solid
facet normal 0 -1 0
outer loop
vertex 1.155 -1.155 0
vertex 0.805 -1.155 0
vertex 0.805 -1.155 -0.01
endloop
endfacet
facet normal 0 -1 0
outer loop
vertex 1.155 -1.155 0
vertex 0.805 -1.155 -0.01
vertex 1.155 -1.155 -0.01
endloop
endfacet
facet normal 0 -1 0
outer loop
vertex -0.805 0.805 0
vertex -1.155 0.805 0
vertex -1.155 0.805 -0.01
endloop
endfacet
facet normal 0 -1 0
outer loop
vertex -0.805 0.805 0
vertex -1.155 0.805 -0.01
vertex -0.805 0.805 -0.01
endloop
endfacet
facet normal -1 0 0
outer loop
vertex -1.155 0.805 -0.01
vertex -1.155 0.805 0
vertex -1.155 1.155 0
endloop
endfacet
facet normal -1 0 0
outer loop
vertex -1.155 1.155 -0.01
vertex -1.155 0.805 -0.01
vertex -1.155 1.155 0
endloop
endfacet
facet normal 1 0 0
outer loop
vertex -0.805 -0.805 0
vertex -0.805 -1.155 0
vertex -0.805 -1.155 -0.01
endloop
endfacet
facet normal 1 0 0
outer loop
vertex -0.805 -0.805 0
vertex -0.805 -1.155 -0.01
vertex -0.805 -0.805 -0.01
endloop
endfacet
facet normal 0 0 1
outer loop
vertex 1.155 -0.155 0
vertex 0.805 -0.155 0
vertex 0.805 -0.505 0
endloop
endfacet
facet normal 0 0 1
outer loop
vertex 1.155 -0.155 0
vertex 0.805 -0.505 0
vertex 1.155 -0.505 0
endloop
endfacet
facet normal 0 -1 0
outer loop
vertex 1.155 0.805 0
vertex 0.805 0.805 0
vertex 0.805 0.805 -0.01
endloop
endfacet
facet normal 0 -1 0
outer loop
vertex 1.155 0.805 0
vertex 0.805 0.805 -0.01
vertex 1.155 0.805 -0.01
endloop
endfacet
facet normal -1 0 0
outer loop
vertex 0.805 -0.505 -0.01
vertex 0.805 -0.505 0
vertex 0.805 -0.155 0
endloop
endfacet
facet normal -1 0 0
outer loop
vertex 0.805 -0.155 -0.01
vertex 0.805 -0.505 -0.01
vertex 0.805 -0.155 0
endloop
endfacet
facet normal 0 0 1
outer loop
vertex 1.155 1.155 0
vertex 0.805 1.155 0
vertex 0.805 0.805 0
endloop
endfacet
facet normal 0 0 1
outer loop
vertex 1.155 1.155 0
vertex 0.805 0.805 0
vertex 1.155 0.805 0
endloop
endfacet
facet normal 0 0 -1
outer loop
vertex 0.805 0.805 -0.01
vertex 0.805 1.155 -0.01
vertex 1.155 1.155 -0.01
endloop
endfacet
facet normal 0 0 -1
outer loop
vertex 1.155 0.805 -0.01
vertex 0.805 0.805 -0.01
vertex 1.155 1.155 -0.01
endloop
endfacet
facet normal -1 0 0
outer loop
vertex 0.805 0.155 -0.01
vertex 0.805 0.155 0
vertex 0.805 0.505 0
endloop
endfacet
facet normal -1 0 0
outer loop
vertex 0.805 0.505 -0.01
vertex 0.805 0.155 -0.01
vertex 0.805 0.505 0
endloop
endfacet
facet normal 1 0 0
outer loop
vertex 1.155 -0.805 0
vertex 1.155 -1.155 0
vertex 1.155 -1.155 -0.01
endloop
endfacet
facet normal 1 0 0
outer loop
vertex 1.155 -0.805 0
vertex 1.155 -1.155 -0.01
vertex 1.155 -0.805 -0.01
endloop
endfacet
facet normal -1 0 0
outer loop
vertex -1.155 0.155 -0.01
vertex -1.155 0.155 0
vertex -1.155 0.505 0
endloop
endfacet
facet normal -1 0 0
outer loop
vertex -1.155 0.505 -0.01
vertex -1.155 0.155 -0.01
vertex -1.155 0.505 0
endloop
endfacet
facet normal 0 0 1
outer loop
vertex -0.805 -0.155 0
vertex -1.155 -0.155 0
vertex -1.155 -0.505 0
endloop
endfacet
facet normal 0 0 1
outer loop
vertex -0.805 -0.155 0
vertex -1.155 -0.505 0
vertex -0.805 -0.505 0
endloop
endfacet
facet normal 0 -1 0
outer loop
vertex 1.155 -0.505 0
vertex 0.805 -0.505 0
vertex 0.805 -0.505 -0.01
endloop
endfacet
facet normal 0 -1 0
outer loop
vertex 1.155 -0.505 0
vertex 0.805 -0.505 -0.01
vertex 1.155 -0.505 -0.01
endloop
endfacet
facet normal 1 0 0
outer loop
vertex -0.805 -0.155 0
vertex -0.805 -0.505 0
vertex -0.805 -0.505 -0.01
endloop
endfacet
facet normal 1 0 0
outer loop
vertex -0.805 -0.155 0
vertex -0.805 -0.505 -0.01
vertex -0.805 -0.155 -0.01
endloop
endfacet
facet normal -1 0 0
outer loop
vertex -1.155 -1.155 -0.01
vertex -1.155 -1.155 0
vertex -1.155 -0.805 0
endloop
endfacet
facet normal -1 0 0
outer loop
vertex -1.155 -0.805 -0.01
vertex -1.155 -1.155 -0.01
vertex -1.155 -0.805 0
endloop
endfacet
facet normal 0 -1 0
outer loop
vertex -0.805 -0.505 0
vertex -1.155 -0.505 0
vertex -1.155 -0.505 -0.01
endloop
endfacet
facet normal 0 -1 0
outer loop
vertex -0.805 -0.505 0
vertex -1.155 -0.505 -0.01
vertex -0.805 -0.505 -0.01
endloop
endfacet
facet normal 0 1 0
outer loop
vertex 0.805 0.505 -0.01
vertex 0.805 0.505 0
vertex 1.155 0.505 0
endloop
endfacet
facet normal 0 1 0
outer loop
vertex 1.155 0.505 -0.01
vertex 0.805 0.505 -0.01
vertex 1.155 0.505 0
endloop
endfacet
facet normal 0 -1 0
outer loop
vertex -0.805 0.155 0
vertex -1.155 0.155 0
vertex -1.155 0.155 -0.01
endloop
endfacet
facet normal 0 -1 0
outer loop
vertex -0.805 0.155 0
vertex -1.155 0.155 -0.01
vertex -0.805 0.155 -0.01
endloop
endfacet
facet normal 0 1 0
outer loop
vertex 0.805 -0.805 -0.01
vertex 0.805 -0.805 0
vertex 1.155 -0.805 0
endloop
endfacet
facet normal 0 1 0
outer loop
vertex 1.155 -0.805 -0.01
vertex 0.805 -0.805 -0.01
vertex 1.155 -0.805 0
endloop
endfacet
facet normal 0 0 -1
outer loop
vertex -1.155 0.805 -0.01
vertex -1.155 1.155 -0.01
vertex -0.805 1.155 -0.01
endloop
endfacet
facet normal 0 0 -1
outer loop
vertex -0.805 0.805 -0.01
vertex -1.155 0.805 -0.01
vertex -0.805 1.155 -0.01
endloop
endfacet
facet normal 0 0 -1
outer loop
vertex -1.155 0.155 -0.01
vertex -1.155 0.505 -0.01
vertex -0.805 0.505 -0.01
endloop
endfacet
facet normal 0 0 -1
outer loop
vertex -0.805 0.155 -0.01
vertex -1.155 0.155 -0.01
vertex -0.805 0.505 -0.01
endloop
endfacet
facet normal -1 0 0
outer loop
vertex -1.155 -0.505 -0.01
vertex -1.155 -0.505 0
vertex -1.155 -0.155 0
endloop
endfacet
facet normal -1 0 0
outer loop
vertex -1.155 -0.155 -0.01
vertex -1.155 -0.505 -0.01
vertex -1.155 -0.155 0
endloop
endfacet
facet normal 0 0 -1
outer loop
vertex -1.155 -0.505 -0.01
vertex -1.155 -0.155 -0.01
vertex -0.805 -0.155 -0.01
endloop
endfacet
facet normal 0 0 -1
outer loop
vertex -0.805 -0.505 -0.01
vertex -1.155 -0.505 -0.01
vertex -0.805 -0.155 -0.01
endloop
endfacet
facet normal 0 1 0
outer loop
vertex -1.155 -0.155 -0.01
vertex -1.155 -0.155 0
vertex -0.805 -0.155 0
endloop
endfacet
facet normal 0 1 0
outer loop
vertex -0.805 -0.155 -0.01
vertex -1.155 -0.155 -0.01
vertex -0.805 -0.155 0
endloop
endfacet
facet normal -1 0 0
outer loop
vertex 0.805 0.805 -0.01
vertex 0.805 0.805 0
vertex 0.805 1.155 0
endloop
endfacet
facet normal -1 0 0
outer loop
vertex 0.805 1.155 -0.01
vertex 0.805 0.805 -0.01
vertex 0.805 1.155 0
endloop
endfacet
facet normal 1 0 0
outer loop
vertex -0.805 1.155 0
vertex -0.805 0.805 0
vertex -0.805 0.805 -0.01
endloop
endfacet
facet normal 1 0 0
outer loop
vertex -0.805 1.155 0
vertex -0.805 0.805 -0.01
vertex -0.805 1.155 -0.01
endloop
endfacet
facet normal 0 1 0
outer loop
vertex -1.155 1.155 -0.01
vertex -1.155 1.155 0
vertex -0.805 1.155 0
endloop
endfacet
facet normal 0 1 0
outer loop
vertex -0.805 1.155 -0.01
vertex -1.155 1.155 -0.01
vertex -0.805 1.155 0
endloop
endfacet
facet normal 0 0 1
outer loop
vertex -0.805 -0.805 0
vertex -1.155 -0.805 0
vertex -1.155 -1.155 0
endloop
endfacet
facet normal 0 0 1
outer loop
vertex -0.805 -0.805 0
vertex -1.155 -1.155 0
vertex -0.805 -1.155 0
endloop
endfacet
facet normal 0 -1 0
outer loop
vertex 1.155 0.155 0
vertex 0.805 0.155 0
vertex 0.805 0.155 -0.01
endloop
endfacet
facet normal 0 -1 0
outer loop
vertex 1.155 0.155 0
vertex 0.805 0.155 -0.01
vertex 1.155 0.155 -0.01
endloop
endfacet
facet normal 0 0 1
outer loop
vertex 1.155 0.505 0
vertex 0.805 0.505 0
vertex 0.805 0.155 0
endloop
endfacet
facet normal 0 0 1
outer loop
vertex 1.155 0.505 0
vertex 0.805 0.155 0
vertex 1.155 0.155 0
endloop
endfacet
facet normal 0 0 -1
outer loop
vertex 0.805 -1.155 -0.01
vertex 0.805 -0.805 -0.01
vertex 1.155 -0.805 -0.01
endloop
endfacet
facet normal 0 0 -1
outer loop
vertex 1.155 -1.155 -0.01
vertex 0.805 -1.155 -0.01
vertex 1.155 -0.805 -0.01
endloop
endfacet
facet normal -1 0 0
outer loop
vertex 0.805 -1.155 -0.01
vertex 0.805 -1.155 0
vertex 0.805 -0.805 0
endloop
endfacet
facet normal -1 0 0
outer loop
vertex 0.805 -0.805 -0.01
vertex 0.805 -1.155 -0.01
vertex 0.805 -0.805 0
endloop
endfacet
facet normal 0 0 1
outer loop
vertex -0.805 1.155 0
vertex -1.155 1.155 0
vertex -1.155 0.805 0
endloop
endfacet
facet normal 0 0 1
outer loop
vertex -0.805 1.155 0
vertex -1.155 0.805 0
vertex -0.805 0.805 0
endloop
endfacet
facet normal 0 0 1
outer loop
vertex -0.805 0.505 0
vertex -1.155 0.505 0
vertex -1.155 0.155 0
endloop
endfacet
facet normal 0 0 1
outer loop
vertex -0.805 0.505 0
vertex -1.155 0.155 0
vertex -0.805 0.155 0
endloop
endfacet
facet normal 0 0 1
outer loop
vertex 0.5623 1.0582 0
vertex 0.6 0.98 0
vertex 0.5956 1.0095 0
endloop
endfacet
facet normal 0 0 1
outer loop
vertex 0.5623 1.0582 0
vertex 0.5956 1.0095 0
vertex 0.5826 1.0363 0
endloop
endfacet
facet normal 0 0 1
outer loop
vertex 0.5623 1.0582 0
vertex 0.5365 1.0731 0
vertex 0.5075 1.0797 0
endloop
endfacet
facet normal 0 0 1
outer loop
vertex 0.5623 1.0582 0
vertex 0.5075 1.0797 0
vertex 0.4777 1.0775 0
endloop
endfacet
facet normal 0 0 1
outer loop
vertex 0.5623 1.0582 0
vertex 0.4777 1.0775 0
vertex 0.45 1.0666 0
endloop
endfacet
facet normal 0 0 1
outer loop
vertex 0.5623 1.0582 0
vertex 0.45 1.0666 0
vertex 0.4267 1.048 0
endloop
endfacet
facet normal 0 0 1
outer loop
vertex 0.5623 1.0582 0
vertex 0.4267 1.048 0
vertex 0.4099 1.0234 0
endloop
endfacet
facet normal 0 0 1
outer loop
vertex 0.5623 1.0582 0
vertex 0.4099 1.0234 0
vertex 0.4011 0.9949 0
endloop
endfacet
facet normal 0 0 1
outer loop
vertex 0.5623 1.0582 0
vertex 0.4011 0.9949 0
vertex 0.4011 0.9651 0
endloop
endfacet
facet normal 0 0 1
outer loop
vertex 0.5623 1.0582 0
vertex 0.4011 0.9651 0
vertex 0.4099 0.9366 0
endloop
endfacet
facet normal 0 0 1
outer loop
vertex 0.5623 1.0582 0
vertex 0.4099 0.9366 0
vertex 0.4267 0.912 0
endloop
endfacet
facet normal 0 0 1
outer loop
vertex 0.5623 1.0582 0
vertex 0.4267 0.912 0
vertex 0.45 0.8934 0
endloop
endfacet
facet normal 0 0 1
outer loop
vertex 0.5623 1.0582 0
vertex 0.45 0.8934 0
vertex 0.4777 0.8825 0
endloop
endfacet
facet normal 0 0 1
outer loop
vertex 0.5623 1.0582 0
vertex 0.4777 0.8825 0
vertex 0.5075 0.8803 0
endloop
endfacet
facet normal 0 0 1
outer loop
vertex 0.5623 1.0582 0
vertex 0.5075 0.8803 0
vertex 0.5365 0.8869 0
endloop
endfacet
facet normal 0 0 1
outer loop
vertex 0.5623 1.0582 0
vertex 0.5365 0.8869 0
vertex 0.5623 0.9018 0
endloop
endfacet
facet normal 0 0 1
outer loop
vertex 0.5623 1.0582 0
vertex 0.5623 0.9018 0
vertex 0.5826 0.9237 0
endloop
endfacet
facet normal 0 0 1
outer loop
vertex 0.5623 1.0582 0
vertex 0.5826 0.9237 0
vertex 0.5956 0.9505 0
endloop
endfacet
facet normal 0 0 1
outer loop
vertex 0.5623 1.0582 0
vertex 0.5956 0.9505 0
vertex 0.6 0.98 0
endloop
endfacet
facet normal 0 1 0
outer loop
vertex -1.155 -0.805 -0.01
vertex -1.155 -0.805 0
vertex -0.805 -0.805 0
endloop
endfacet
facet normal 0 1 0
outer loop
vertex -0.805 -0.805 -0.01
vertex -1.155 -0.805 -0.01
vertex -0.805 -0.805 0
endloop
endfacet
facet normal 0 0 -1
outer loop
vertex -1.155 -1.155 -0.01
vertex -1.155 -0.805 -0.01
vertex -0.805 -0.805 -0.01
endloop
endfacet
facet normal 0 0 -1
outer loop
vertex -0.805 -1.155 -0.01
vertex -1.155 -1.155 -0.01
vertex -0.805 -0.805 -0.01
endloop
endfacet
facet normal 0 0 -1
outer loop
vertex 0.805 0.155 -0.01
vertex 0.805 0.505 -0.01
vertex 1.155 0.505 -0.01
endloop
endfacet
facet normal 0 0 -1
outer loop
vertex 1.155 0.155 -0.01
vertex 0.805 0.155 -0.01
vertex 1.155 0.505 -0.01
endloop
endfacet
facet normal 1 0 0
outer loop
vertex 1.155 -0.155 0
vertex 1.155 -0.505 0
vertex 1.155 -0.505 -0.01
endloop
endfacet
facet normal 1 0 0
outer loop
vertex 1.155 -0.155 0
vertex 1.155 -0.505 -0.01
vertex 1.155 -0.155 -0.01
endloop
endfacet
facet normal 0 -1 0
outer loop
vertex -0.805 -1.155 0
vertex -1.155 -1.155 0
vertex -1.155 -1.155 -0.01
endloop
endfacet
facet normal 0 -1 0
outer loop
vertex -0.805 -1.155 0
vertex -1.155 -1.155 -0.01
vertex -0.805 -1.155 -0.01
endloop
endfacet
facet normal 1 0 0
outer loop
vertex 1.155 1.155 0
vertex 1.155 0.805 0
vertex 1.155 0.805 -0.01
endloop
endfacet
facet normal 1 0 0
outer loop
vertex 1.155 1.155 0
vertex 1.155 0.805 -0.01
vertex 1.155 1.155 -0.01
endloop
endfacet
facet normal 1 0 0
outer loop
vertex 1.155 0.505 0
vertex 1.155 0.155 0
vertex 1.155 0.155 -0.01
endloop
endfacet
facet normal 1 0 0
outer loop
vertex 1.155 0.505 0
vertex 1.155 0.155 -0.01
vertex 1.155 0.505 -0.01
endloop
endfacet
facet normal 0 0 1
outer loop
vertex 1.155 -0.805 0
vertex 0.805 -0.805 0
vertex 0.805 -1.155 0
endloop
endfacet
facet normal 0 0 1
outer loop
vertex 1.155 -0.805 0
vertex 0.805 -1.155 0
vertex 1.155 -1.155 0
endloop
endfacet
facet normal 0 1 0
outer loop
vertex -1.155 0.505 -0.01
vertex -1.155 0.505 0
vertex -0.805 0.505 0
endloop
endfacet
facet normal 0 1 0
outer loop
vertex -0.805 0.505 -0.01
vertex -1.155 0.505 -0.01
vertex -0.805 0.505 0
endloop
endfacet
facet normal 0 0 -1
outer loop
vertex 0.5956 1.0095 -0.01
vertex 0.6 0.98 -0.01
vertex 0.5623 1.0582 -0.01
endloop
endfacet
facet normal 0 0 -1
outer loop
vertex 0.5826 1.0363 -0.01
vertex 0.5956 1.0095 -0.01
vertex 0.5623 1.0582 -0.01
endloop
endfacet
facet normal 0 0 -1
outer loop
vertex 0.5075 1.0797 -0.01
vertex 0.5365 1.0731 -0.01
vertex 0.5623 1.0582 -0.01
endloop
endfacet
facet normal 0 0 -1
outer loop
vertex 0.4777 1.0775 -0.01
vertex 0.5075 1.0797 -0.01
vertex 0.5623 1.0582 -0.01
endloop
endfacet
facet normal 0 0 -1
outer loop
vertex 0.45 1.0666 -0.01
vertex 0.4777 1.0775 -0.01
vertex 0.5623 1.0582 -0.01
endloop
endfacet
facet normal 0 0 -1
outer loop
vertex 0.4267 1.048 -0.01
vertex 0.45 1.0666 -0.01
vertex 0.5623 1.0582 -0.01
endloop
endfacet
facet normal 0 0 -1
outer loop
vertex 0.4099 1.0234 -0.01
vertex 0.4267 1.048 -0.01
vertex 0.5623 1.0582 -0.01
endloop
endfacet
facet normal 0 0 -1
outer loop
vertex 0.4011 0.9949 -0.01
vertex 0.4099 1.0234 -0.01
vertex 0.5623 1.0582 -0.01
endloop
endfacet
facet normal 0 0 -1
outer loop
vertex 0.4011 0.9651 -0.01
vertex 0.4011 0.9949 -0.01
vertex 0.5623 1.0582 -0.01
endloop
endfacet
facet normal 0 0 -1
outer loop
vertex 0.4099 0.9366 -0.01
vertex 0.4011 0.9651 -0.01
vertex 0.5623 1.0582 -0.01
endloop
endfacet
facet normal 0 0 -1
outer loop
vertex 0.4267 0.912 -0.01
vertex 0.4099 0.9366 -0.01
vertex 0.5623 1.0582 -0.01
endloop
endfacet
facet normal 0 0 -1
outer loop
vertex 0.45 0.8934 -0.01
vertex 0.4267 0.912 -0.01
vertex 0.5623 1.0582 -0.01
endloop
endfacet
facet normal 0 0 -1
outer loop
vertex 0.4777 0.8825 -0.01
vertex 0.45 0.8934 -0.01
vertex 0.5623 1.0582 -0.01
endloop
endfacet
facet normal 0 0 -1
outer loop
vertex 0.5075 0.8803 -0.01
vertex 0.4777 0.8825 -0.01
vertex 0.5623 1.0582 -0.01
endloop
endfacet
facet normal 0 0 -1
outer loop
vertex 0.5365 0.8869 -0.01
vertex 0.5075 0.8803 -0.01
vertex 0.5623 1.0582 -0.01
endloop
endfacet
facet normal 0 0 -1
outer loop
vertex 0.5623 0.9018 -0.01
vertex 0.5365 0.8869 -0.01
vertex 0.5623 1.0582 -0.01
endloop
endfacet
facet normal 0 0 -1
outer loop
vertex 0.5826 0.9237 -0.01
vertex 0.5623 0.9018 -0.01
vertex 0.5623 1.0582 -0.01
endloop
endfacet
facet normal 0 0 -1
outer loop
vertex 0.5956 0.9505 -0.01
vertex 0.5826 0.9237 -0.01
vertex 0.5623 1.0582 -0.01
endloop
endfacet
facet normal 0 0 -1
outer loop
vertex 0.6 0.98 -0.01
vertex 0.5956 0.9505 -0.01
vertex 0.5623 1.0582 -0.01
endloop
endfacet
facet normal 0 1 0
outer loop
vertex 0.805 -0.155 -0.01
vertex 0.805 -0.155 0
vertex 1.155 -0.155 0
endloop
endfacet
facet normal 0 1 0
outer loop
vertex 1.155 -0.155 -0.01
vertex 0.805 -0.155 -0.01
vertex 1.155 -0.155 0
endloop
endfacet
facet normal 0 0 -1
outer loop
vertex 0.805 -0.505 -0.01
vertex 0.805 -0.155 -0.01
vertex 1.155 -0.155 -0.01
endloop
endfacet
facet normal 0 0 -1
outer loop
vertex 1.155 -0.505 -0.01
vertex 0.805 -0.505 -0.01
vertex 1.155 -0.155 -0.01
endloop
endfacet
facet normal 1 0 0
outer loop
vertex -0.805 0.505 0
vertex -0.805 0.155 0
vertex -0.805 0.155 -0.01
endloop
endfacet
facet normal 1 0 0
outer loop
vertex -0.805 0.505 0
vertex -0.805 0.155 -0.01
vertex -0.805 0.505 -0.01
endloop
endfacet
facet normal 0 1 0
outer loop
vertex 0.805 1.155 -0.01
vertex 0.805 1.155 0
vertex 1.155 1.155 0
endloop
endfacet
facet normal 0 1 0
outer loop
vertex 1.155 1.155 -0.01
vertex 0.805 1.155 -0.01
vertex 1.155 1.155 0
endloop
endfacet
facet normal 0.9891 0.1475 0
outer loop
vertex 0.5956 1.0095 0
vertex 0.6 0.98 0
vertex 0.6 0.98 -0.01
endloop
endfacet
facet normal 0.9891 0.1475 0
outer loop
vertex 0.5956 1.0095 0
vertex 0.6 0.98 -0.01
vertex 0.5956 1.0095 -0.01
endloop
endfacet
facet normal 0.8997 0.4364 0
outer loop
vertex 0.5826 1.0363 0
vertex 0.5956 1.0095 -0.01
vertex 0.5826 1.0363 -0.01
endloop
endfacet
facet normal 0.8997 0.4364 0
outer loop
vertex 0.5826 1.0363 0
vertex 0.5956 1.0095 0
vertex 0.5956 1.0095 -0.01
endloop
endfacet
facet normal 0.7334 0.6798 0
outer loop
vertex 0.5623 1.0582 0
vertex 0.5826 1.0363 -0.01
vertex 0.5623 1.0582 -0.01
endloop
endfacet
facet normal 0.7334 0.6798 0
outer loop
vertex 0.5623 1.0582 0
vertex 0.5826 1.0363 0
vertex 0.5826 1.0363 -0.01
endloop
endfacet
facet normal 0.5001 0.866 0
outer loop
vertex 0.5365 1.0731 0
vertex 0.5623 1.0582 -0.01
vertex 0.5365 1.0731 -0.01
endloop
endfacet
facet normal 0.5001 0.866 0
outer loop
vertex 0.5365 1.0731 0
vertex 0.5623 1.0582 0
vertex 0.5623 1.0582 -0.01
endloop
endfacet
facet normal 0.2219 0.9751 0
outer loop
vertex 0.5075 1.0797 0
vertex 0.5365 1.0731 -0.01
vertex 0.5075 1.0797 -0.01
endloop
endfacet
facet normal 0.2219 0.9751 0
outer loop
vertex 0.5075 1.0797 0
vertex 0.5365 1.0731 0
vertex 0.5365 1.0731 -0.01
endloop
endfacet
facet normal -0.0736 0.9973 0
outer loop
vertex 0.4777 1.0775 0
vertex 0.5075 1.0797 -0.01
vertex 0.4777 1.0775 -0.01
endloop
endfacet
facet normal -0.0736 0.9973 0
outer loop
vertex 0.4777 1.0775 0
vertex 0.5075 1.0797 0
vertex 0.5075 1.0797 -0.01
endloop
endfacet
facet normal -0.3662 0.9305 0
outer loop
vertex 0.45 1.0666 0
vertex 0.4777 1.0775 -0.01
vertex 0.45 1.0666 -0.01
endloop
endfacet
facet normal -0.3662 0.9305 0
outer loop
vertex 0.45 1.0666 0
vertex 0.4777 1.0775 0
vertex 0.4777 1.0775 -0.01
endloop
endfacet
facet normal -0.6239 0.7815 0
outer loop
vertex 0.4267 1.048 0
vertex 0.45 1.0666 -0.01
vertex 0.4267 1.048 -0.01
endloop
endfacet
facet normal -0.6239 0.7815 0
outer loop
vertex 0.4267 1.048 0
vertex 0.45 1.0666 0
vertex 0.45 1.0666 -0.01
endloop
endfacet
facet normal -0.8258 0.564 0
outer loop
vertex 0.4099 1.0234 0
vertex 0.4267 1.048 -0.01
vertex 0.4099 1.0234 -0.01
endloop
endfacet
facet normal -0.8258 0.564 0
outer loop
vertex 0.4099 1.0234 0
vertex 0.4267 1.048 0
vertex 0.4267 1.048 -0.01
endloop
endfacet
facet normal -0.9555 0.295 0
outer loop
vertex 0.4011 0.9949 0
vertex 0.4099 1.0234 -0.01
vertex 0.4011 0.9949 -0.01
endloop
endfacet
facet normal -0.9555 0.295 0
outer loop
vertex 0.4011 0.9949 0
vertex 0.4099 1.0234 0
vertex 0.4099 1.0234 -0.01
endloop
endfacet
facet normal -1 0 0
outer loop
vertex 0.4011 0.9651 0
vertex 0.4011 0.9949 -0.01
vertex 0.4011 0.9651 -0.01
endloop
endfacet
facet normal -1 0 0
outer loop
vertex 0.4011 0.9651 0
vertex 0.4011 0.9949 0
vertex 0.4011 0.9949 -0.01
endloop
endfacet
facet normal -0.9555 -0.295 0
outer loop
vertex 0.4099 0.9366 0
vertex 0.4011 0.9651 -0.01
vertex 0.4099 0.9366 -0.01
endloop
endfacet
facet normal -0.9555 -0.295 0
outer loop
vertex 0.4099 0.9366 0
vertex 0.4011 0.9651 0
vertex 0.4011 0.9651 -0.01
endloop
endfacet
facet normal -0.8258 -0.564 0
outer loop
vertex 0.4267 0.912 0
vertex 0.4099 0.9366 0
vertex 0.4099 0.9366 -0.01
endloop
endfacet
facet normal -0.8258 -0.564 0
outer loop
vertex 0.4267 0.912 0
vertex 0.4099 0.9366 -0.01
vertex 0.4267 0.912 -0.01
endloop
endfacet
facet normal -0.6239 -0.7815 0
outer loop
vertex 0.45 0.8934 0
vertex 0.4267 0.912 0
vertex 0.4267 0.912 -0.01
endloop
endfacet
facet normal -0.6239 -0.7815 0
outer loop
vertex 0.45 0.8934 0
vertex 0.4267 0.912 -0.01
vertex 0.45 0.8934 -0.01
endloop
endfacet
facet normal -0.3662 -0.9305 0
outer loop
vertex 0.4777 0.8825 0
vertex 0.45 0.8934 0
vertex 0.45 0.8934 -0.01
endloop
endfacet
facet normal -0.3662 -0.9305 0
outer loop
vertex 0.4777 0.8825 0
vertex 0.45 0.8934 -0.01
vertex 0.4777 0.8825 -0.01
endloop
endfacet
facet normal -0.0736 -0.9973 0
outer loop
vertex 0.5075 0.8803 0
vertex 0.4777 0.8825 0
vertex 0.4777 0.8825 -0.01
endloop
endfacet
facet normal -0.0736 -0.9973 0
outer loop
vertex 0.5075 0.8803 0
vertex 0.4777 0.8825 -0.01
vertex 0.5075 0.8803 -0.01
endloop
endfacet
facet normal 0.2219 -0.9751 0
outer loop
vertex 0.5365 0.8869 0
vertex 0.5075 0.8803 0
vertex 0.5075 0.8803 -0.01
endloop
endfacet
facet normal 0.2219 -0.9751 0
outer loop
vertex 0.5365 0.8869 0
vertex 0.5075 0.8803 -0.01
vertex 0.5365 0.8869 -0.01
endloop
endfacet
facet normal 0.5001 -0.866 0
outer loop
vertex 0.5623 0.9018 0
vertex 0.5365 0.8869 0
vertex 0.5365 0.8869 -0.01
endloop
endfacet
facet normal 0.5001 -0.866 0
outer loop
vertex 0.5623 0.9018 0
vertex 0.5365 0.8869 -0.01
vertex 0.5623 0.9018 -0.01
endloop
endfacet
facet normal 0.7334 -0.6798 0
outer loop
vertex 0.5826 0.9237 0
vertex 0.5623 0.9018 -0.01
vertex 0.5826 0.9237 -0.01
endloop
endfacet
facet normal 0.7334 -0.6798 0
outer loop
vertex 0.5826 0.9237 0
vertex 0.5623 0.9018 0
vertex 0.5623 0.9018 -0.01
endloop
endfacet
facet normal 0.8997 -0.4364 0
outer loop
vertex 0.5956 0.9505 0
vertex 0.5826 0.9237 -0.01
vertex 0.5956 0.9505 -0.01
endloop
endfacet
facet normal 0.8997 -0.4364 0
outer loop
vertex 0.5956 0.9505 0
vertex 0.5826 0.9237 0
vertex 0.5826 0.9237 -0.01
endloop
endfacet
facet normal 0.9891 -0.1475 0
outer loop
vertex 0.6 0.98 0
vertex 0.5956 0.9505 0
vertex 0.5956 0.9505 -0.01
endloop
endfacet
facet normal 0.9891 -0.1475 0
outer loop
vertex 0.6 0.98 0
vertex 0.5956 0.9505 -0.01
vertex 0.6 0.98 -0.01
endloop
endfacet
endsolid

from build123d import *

# Parameters (mm, degrees)
SKETCH009_W  = 0.35
SKETCH009_H  = 0.35
PAD008_DEPTH = 0.01
SKETCH007_W  = 0.35
SKETCH007_H  = 0.35
PAD006_DEPTH = 0.01
SKETCH008_W  = 0.35
SKETCH008_H  = 0.35
PAD007_DEPTH = 0.01
SKETCH011_W  = 0.35
SKETCH011_H  = 0.35
PAD010_DEPTH = 0.01
SKETCH014_R  = 0.1
PAD013_DEPTH = 0.01
SKETCH012_W  = 0.35
SKETCH012_H  = 0.35
PAD011_DEPTH = 0.01
SKETCH010_W  = 0.35
SKETCH010_H  = 0.35
PAD009_DEPTH = 0.01
SKETCH013_W  = 0.35
SKETCH013_H  = 0.35
PAD012_DEPTH = 0.01
SKETCH006_W  = 0.35
SKETCH006_H  = 0.35
PAD005_DEPTH = 0.01


with BuildPart() as pad_5_sdo:
    # Sketch009 → Pad008 (new body)
    with BuildSketch(Plane.XY):
        with Locations((-0.98, -0.98)):
            Rectangle(SKETCH009_W, SKETCH009_H)
    extrude(amount=-PAD008_DEPTH)


with BuildPart() as pad_7_gnd:
    # Sketch007 → Pad006 (new body)
    with BuildSketch(Plane.XY):
        with Locations((-0.98, 0.33)):
            Rectangle(SKETCH007_W, SKETCH007_H)
    extrude(amount=-PAD006_DEPTH)


with BuildPart() as pad_6_vddio:
    # Sketch008 → Pad007 (new body)
    with BuildSketch(Plane.XY):
        with Locations((-0.98, -0.33)):
            Rectangle(SKETCH008_W, SKETCH008_H)
    extrude(amount=-PAD007_DEPTH)


with BuildPart() as pad_3_sdi:
    # Sketch011 → Pad010 (new body)
    with BuildSketch(Plane.XY):
        with Locations((0.98, -0.33)):
            Rectangle(SKETCH011_W, SKETCH011_H)
    extrude(amount=-PAD010_DEPTH)


with BuildPart() as marker_pad:
    # Sketch014 → Pad013 (new body)
    with BuildSketch(Plane.XY):
        with Locations((0.5, 0.98)):
            Circle(SKETCH014_R)
    extrude(amount=-PAD013_DEPTH)


with BuildPart() as pad_2_csb:
    # Sketch012 → Pad011 (new body)
    with BuildSketch(Plane.XY):
        with Locations((0.98, 0.33)):
            Rectangle(SKETCH012_W, SKETCH012_H)
    extrude(amount=-PAD011_DEPTH)


with BuildPart() as pad_4_sck:
    # Sketch010 → Pad009 (new body)
    with BuildSketch(Plane.XY):
        with Locations((0.98, -0.98)):
            Rectangle(SKETCH010_W, SKETCH010_H)
    extrude(amount=-PAD009_DEPTH)


with BuildPart() as pad_1_gnd:
    # Sketch013 → Pad012 (new body)
    with BuildSketch(Plane.XY):
        with Locations((0.98, 0.98)):
            Rectangle(SKETCH013_W, SKETCH013_H)
    extrude(amount=-PAD012_DEPTH)


with BuildPart() as pads:
    # Sketch006 → Pad005 (new body)
    with BuildSketch(Plane.XY):
        with Locations((-0.98, 0.98)):
            Rectangle(SKETCH006_W, SKETCH006_H)
    extrude(amount=-PAD005_DEPTH)

    # Fusion: union pad_5_SDO, pad_7_GND, pad_6_VDDIO, pad_3_SDI, marker_pad, pad_2_CSB, pad_4_SCK, pad_1_GND
    add(pad_5_sdo.part)
    add(pad_7_gnd.part)
    add(pad_6_vddio.part)
    add(pad_3_sdi.part)
    add(marker_pad.part)
    add(pad_2_csb.part)
    add(pad_4_sck.part)
    add(pad_1_gnd.part)


solid = pads.part
